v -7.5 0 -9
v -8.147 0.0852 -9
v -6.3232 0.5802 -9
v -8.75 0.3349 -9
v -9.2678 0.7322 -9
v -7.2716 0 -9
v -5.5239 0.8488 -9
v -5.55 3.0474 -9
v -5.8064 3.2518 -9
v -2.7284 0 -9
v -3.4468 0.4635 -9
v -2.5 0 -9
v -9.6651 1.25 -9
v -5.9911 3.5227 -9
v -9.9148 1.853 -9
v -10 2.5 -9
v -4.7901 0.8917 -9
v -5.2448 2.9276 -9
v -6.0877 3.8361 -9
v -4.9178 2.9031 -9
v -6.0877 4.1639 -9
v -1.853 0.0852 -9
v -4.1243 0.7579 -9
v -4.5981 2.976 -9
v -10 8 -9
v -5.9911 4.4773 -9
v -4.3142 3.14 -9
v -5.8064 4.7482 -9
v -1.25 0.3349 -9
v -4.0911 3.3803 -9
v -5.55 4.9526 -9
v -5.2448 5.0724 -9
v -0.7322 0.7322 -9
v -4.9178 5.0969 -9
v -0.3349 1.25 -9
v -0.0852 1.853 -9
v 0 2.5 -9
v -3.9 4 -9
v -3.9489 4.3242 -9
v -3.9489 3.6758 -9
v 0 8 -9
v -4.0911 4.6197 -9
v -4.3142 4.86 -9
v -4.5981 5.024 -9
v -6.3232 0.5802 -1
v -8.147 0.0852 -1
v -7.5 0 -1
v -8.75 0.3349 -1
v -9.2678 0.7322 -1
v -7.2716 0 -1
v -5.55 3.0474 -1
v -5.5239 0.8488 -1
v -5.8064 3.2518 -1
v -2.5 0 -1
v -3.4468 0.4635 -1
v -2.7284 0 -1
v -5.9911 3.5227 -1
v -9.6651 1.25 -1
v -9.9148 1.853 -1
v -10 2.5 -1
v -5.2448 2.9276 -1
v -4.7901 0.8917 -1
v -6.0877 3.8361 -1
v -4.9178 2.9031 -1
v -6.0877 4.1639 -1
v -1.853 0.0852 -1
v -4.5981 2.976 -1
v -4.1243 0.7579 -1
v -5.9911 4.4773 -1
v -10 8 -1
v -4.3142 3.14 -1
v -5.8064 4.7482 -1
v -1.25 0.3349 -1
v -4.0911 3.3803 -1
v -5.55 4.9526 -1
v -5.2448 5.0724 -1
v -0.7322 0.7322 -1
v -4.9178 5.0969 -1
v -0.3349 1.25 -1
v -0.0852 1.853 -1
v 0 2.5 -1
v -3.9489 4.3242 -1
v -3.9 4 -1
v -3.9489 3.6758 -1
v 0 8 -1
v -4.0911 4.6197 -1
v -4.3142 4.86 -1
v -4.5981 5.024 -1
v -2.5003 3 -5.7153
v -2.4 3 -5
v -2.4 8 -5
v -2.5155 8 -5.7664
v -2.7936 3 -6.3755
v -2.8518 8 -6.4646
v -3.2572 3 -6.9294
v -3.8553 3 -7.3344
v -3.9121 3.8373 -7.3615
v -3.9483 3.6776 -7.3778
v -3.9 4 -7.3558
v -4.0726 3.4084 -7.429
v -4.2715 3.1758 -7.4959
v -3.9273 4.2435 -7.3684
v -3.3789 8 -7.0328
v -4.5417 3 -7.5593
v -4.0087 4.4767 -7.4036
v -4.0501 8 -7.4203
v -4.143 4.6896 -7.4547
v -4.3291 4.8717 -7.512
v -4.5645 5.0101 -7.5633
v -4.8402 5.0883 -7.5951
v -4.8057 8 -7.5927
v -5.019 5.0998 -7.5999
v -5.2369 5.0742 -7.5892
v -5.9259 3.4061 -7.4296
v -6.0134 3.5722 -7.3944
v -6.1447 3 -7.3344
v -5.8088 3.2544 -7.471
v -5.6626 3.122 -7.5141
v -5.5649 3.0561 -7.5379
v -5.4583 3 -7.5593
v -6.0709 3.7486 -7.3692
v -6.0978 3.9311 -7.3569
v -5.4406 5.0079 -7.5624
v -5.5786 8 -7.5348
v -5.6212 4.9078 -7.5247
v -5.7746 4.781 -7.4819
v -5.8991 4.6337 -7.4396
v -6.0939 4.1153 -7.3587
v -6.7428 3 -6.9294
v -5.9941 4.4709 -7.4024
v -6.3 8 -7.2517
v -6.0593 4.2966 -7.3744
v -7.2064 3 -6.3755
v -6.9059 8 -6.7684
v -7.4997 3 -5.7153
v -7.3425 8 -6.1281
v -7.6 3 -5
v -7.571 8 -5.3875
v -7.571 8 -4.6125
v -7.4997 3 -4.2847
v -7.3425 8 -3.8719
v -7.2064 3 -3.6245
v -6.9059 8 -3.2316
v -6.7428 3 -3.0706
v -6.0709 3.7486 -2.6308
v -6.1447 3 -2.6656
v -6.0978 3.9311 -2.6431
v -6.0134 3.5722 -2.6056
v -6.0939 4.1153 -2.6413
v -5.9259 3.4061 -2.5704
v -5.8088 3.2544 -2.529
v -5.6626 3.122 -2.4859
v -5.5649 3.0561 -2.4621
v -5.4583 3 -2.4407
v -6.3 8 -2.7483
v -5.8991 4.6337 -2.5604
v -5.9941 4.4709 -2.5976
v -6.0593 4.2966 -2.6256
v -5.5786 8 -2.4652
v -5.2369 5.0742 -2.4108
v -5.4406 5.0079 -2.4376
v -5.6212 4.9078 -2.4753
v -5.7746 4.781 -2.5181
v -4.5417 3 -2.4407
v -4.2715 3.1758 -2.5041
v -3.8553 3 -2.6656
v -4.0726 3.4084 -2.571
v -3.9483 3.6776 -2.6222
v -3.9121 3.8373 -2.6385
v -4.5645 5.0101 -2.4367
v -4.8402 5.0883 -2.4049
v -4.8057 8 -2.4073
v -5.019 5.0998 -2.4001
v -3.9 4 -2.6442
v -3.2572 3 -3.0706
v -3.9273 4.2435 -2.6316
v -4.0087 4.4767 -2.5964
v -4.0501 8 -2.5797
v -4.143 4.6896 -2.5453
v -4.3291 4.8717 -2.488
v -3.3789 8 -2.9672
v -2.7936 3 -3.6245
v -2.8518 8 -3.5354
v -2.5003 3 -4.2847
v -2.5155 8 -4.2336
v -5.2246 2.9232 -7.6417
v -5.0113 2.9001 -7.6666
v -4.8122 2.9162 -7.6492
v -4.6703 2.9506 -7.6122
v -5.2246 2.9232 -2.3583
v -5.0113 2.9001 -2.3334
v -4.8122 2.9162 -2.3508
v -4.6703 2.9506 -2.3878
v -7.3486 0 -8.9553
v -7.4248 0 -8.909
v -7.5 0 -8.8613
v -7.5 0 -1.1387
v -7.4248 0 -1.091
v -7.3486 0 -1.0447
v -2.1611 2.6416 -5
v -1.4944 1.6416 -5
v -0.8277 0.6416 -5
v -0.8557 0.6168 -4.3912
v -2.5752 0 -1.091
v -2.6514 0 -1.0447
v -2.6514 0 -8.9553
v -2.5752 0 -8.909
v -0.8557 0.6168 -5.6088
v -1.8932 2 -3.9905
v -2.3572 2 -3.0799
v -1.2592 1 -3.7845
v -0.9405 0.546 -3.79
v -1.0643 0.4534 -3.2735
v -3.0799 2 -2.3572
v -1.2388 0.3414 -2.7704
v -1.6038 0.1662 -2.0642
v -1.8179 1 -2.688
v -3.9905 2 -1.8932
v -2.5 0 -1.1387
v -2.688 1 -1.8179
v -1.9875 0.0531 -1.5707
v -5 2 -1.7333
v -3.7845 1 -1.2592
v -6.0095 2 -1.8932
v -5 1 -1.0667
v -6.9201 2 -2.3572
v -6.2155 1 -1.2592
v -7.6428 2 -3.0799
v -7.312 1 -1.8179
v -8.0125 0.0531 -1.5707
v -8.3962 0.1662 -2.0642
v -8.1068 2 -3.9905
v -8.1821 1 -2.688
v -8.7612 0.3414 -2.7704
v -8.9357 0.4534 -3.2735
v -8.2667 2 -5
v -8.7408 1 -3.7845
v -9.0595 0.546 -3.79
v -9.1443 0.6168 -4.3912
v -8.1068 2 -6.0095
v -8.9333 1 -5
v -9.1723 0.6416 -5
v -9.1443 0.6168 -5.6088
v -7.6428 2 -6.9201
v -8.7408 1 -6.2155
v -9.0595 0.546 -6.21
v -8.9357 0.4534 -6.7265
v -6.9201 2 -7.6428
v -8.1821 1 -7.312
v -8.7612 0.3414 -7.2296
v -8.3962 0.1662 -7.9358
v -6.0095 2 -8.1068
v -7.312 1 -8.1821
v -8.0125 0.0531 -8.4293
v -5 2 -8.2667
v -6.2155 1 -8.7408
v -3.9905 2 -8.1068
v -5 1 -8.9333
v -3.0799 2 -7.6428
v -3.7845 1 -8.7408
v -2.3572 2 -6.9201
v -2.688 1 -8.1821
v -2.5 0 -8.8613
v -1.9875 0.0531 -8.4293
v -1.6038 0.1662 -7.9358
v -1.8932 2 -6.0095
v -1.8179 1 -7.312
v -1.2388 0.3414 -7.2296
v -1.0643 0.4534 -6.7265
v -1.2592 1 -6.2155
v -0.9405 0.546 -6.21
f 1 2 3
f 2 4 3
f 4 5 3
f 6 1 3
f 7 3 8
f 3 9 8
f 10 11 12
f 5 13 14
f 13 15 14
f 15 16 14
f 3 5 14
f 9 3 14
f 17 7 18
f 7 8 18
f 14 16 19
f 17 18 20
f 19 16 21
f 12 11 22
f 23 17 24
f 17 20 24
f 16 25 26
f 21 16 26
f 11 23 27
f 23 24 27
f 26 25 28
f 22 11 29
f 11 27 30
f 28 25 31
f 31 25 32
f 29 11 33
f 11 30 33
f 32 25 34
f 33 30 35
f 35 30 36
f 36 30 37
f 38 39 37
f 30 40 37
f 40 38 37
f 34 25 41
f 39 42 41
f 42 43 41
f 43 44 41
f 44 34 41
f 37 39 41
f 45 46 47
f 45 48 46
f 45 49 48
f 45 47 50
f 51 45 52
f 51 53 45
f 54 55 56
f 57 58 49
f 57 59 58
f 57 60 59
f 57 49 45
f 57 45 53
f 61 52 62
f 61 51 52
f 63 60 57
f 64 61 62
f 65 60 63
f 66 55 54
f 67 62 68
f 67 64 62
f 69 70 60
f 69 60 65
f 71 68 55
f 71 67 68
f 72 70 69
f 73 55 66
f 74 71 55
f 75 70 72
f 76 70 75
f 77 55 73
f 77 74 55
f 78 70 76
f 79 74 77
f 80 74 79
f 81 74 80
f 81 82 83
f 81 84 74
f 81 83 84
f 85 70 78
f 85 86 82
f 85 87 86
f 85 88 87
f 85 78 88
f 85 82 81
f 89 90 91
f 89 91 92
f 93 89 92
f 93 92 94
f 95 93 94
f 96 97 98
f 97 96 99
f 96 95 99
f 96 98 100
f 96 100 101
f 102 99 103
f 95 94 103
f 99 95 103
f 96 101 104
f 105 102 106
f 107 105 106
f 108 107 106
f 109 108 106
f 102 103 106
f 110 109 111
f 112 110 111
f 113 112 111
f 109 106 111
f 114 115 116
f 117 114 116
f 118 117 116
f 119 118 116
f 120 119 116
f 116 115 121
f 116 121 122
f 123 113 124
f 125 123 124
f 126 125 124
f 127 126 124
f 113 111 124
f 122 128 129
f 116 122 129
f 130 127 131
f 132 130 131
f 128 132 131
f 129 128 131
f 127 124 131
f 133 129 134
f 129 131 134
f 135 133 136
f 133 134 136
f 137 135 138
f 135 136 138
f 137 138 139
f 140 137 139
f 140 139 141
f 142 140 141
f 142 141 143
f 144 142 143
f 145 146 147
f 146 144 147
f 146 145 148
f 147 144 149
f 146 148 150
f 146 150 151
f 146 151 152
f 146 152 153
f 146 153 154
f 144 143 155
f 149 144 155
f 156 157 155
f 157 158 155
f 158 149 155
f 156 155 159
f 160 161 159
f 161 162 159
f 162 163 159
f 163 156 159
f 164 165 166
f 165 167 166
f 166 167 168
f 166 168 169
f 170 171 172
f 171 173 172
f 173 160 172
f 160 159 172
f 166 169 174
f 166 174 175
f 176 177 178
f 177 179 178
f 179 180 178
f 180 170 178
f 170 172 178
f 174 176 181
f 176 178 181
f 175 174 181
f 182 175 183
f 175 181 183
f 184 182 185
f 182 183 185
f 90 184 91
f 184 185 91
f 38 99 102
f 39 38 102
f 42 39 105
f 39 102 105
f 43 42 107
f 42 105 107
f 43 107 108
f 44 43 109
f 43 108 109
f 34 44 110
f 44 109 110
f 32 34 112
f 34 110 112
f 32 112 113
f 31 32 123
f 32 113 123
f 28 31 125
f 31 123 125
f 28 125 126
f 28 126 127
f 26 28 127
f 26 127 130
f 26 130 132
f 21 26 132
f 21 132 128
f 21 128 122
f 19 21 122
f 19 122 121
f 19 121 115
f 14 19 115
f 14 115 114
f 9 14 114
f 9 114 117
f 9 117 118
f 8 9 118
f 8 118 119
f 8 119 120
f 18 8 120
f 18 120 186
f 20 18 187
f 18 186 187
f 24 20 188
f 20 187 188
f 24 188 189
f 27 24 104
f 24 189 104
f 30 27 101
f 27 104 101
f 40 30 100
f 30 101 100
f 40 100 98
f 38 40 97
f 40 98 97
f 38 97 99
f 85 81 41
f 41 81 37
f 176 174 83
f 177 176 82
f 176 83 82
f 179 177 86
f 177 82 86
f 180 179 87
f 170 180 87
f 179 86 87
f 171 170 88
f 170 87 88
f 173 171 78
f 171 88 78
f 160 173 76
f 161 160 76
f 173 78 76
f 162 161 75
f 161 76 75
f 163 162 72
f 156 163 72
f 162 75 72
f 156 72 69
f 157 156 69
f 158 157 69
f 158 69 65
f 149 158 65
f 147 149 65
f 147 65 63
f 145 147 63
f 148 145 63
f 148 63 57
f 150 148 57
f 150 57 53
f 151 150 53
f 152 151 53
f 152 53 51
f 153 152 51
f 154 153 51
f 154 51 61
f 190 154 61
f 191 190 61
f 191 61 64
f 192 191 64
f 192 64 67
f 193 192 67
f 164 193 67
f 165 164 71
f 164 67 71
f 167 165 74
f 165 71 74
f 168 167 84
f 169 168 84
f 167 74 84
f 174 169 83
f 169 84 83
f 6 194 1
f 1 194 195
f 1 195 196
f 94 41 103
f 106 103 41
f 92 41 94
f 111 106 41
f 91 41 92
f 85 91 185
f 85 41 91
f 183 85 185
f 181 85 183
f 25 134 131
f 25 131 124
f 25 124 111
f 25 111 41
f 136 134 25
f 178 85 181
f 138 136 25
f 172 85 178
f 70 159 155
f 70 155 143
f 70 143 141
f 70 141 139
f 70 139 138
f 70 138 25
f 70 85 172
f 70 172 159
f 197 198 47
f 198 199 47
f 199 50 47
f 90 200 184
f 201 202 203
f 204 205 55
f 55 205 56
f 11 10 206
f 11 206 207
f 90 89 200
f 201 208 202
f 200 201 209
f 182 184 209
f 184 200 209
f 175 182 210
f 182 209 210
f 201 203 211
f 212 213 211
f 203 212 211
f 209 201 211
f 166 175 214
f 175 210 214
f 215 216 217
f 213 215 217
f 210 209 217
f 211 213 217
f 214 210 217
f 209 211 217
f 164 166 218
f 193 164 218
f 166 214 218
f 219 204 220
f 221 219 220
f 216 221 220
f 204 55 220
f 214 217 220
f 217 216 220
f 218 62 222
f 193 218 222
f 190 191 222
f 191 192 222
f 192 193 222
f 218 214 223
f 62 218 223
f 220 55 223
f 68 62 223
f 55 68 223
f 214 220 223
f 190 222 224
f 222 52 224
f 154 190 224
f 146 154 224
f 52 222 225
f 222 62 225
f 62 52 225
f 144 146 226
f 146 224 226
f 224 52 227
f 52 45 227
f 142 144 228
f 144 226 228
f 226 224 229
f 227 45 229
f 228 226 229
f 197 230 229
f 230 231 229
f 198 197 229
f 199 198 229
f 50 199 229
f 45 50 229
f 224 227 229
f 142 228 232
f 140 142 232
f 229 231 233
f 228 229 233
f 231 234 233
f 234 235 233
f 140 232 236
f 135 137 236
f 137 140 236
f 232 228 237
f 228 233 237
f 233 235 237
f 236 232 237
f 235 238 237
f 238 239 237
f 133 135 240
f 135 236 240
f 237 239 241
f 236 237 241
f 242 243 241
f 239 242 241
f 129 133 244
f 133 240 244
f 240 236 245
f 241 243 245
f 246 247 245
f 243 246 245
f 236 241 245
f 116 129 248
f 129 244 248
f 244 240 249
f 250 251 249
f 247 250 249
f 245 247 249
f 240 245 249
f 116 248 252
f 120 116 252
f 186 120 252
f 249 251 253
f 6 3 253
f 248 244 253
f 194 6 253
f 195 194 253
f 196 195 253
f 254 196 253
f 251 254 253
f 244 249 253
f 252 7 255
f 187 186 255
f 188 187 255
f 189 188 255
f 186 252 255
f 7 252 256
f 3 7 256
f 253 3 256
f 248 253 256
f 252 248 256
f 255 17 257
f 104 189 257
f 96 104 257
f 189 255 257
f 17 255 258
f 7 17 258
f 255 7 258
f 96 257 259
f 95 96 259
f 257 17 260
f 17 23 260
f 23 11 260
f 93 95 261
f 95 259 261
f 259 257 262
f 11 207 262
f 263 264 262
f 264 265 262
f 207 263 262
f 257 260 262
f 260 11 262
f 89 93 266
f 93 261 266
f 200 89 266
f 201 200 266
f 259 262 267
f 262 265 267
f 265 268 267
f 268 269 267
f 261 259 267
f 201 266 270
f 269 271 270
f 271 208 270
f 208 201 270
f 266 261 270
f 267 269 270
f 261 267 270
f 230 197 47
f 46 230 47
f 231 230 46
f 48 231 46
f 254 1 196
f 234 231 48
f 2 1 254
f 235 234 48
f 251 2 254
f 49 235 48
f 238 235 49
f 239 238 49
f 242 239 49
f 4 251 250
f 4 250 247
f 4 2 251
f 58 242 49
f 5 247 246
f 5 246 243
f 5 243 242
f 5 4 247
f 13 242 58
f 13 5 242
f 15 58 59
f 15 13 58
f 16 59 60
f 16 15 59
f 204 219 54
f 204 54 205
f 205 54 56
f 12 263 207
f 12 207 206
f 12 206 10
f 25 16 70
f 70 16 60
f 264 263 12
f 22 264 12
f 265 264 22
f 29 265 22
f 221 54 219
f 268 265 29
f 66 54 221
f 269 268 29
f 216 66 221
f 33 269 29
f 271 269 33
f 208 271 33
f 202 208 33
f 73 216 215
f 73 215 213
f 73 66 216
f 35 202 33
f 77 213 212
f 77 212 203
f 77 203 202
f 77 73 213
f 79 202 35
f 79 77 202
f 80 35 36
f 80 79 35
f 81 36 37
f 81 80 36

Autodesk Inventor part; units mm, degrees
ref_plane "YZ Plane" through (0, 0, 0) normal (1, 0, 0) x (0, 1, 0)
ref_plane "XZ Plane" through (0, 0, 0) normal (0, 1, 0) x (-1, 0, 0)
ref_plane "XY Plane" through (0, 0, 0) normal (0, 0, 1) x (1, 0, 0)
sketch "Sketch1" plane through (0, 0, 0) normal (0, 1, 0) x (-1, 0, 0)
  line L0 (0, 0) -> (0, -10)
  line L1 (0, -10) -> (10, -10)
  line L2 (10, -10) -> (10, 0)
  line L3 (10, 0) -> (0, 0)
  dimension "d0" = 10
  dimension "d1" = 10
extrude "Extrusion1" add sketch "Sketch1" along normal blind 8
sketch "Sketch2" plane through (0, 8, 0) normal (0, 1, 0) x (1, 0, 0)
  line L0 (-10, 10) -> (-10, 0) projected
  line L1 (-10, 0) -> (0, 0) projected
  line L2 (-10, 10) -> (0, 0)
  line L3 (0, 0) -> (-10, 0)
  line L4 (-10, 0) -> (0, 10)
  circle A0 centre (-5, 5) radius 2.6
  dimension "d4" = 5.2
extrude "Extrusion2" cut sketch "Sketch2" against normal through all contours A0 L4 L2 | L2 L4 A0 | L4 L2 A0 | L4 A0 L2
chamfer "Chamfer1" distance 2 distance2 3 1 edges at (-7.6, 0, -5) measured on face at (-5.1045, 0, -9.1937)
sketch "Sketch3" plane through (-10, 0, 0) normal (0, 0, 1) x (1, 0, 0)
  line L0 (7.6, 8) -> (7.6, 3) projected
  line L1 (7.6, 8) -> (10, 8)
  line L2 (10, 8) -> (10, 0)
  line L3 (10, 0) -> (7.6, 0)
  line L4 (0, 0) -> (10, 0) projected
  line L5 (2.4, 8) -> (7.6, 8) projected
  line L6 (7.6, 8) -> (7.6, 0)
  line L7 (0, 8) -> (10, 8) projected
  line L8 (10, 0) -> (10, 8) projected
  line L9 (0, 8) -> (10, 0)
  line L10 (10, 0) -> (0, 0)
  line L11 (10, 8) -> (0, 0)
  circle A0 centre (5, 4) radius 1.1
  dimension "d10" = 2.2
extrude "Extrusion3" cut sketch "Sketch3" against normal through all contours A0 L9 L11 | L11 L9 A0 | L11 A0 L9 | L9 A0 L11
fillet "Fillet1" radius 2.5 2 edges at (0, 0, -5) (-10, 0, -5)
sketch "Sketch4" plane through (0, 8, 0) normal (0, 1, 0) x (1, 0, 0)
  arc A0 (-4.5417, 2.4407) -> (-4.5417, 7.5593) centre (-5, 5) ccw projected
  line L0 (-5, 5) -> (0, 5)
  line L1 (0, 0) -> (0, 10) projected
  line L2 (0, 5) -> (0, 8)
  line L3 (0, 8) -> (-10, 8)
  line L4 (-10, 10) -> (-10, 0) projected
  line L5 (-10, 8) -> (-10, 0)
  line L6 (-10, 0) -> (0, 0)
  line L7 (0, 0) -> (0, 8)
  line L8 (0, 10) -> (-10, 10) projected
  line L9 (0, 8) -> (0, 10)
  line L10 (0, 10) -> (-10, 10)
  line L11 (-10, 10) -> (-10, 8)
  line L12 (-10, 0) -> (-10, 0)
  line L13 (0, 0) -> (-2.5, 0) projected
  line L14 (-10, 0) -> (0, 0)
  line L15 (0, 0) -> (0, 0)
  line L16 (-10, 0) -> (-10, 10) projected
  line L17 (-10, 5) -> (-10, 9)
  line L18 (-10, 9) -> (-10, 1)
  line L19 (-10, 1) -> (0, 1)
  line L20 (0, 10) -> (0, 0) projected
  line L21 (-10, 9) -> (0, 9)
  point P0 (0, 0)
  point P1 (-10, 0)
  dimension "d14" = 3
  dimension "d15" = 8
  dimension "d18" = 8
extrude "Extrusion4" cut sketch "Sketch4" against normal through all contours L6 L4 L19 L1 | L21 L4 L8 L1
properties part number "pist-dolni"
